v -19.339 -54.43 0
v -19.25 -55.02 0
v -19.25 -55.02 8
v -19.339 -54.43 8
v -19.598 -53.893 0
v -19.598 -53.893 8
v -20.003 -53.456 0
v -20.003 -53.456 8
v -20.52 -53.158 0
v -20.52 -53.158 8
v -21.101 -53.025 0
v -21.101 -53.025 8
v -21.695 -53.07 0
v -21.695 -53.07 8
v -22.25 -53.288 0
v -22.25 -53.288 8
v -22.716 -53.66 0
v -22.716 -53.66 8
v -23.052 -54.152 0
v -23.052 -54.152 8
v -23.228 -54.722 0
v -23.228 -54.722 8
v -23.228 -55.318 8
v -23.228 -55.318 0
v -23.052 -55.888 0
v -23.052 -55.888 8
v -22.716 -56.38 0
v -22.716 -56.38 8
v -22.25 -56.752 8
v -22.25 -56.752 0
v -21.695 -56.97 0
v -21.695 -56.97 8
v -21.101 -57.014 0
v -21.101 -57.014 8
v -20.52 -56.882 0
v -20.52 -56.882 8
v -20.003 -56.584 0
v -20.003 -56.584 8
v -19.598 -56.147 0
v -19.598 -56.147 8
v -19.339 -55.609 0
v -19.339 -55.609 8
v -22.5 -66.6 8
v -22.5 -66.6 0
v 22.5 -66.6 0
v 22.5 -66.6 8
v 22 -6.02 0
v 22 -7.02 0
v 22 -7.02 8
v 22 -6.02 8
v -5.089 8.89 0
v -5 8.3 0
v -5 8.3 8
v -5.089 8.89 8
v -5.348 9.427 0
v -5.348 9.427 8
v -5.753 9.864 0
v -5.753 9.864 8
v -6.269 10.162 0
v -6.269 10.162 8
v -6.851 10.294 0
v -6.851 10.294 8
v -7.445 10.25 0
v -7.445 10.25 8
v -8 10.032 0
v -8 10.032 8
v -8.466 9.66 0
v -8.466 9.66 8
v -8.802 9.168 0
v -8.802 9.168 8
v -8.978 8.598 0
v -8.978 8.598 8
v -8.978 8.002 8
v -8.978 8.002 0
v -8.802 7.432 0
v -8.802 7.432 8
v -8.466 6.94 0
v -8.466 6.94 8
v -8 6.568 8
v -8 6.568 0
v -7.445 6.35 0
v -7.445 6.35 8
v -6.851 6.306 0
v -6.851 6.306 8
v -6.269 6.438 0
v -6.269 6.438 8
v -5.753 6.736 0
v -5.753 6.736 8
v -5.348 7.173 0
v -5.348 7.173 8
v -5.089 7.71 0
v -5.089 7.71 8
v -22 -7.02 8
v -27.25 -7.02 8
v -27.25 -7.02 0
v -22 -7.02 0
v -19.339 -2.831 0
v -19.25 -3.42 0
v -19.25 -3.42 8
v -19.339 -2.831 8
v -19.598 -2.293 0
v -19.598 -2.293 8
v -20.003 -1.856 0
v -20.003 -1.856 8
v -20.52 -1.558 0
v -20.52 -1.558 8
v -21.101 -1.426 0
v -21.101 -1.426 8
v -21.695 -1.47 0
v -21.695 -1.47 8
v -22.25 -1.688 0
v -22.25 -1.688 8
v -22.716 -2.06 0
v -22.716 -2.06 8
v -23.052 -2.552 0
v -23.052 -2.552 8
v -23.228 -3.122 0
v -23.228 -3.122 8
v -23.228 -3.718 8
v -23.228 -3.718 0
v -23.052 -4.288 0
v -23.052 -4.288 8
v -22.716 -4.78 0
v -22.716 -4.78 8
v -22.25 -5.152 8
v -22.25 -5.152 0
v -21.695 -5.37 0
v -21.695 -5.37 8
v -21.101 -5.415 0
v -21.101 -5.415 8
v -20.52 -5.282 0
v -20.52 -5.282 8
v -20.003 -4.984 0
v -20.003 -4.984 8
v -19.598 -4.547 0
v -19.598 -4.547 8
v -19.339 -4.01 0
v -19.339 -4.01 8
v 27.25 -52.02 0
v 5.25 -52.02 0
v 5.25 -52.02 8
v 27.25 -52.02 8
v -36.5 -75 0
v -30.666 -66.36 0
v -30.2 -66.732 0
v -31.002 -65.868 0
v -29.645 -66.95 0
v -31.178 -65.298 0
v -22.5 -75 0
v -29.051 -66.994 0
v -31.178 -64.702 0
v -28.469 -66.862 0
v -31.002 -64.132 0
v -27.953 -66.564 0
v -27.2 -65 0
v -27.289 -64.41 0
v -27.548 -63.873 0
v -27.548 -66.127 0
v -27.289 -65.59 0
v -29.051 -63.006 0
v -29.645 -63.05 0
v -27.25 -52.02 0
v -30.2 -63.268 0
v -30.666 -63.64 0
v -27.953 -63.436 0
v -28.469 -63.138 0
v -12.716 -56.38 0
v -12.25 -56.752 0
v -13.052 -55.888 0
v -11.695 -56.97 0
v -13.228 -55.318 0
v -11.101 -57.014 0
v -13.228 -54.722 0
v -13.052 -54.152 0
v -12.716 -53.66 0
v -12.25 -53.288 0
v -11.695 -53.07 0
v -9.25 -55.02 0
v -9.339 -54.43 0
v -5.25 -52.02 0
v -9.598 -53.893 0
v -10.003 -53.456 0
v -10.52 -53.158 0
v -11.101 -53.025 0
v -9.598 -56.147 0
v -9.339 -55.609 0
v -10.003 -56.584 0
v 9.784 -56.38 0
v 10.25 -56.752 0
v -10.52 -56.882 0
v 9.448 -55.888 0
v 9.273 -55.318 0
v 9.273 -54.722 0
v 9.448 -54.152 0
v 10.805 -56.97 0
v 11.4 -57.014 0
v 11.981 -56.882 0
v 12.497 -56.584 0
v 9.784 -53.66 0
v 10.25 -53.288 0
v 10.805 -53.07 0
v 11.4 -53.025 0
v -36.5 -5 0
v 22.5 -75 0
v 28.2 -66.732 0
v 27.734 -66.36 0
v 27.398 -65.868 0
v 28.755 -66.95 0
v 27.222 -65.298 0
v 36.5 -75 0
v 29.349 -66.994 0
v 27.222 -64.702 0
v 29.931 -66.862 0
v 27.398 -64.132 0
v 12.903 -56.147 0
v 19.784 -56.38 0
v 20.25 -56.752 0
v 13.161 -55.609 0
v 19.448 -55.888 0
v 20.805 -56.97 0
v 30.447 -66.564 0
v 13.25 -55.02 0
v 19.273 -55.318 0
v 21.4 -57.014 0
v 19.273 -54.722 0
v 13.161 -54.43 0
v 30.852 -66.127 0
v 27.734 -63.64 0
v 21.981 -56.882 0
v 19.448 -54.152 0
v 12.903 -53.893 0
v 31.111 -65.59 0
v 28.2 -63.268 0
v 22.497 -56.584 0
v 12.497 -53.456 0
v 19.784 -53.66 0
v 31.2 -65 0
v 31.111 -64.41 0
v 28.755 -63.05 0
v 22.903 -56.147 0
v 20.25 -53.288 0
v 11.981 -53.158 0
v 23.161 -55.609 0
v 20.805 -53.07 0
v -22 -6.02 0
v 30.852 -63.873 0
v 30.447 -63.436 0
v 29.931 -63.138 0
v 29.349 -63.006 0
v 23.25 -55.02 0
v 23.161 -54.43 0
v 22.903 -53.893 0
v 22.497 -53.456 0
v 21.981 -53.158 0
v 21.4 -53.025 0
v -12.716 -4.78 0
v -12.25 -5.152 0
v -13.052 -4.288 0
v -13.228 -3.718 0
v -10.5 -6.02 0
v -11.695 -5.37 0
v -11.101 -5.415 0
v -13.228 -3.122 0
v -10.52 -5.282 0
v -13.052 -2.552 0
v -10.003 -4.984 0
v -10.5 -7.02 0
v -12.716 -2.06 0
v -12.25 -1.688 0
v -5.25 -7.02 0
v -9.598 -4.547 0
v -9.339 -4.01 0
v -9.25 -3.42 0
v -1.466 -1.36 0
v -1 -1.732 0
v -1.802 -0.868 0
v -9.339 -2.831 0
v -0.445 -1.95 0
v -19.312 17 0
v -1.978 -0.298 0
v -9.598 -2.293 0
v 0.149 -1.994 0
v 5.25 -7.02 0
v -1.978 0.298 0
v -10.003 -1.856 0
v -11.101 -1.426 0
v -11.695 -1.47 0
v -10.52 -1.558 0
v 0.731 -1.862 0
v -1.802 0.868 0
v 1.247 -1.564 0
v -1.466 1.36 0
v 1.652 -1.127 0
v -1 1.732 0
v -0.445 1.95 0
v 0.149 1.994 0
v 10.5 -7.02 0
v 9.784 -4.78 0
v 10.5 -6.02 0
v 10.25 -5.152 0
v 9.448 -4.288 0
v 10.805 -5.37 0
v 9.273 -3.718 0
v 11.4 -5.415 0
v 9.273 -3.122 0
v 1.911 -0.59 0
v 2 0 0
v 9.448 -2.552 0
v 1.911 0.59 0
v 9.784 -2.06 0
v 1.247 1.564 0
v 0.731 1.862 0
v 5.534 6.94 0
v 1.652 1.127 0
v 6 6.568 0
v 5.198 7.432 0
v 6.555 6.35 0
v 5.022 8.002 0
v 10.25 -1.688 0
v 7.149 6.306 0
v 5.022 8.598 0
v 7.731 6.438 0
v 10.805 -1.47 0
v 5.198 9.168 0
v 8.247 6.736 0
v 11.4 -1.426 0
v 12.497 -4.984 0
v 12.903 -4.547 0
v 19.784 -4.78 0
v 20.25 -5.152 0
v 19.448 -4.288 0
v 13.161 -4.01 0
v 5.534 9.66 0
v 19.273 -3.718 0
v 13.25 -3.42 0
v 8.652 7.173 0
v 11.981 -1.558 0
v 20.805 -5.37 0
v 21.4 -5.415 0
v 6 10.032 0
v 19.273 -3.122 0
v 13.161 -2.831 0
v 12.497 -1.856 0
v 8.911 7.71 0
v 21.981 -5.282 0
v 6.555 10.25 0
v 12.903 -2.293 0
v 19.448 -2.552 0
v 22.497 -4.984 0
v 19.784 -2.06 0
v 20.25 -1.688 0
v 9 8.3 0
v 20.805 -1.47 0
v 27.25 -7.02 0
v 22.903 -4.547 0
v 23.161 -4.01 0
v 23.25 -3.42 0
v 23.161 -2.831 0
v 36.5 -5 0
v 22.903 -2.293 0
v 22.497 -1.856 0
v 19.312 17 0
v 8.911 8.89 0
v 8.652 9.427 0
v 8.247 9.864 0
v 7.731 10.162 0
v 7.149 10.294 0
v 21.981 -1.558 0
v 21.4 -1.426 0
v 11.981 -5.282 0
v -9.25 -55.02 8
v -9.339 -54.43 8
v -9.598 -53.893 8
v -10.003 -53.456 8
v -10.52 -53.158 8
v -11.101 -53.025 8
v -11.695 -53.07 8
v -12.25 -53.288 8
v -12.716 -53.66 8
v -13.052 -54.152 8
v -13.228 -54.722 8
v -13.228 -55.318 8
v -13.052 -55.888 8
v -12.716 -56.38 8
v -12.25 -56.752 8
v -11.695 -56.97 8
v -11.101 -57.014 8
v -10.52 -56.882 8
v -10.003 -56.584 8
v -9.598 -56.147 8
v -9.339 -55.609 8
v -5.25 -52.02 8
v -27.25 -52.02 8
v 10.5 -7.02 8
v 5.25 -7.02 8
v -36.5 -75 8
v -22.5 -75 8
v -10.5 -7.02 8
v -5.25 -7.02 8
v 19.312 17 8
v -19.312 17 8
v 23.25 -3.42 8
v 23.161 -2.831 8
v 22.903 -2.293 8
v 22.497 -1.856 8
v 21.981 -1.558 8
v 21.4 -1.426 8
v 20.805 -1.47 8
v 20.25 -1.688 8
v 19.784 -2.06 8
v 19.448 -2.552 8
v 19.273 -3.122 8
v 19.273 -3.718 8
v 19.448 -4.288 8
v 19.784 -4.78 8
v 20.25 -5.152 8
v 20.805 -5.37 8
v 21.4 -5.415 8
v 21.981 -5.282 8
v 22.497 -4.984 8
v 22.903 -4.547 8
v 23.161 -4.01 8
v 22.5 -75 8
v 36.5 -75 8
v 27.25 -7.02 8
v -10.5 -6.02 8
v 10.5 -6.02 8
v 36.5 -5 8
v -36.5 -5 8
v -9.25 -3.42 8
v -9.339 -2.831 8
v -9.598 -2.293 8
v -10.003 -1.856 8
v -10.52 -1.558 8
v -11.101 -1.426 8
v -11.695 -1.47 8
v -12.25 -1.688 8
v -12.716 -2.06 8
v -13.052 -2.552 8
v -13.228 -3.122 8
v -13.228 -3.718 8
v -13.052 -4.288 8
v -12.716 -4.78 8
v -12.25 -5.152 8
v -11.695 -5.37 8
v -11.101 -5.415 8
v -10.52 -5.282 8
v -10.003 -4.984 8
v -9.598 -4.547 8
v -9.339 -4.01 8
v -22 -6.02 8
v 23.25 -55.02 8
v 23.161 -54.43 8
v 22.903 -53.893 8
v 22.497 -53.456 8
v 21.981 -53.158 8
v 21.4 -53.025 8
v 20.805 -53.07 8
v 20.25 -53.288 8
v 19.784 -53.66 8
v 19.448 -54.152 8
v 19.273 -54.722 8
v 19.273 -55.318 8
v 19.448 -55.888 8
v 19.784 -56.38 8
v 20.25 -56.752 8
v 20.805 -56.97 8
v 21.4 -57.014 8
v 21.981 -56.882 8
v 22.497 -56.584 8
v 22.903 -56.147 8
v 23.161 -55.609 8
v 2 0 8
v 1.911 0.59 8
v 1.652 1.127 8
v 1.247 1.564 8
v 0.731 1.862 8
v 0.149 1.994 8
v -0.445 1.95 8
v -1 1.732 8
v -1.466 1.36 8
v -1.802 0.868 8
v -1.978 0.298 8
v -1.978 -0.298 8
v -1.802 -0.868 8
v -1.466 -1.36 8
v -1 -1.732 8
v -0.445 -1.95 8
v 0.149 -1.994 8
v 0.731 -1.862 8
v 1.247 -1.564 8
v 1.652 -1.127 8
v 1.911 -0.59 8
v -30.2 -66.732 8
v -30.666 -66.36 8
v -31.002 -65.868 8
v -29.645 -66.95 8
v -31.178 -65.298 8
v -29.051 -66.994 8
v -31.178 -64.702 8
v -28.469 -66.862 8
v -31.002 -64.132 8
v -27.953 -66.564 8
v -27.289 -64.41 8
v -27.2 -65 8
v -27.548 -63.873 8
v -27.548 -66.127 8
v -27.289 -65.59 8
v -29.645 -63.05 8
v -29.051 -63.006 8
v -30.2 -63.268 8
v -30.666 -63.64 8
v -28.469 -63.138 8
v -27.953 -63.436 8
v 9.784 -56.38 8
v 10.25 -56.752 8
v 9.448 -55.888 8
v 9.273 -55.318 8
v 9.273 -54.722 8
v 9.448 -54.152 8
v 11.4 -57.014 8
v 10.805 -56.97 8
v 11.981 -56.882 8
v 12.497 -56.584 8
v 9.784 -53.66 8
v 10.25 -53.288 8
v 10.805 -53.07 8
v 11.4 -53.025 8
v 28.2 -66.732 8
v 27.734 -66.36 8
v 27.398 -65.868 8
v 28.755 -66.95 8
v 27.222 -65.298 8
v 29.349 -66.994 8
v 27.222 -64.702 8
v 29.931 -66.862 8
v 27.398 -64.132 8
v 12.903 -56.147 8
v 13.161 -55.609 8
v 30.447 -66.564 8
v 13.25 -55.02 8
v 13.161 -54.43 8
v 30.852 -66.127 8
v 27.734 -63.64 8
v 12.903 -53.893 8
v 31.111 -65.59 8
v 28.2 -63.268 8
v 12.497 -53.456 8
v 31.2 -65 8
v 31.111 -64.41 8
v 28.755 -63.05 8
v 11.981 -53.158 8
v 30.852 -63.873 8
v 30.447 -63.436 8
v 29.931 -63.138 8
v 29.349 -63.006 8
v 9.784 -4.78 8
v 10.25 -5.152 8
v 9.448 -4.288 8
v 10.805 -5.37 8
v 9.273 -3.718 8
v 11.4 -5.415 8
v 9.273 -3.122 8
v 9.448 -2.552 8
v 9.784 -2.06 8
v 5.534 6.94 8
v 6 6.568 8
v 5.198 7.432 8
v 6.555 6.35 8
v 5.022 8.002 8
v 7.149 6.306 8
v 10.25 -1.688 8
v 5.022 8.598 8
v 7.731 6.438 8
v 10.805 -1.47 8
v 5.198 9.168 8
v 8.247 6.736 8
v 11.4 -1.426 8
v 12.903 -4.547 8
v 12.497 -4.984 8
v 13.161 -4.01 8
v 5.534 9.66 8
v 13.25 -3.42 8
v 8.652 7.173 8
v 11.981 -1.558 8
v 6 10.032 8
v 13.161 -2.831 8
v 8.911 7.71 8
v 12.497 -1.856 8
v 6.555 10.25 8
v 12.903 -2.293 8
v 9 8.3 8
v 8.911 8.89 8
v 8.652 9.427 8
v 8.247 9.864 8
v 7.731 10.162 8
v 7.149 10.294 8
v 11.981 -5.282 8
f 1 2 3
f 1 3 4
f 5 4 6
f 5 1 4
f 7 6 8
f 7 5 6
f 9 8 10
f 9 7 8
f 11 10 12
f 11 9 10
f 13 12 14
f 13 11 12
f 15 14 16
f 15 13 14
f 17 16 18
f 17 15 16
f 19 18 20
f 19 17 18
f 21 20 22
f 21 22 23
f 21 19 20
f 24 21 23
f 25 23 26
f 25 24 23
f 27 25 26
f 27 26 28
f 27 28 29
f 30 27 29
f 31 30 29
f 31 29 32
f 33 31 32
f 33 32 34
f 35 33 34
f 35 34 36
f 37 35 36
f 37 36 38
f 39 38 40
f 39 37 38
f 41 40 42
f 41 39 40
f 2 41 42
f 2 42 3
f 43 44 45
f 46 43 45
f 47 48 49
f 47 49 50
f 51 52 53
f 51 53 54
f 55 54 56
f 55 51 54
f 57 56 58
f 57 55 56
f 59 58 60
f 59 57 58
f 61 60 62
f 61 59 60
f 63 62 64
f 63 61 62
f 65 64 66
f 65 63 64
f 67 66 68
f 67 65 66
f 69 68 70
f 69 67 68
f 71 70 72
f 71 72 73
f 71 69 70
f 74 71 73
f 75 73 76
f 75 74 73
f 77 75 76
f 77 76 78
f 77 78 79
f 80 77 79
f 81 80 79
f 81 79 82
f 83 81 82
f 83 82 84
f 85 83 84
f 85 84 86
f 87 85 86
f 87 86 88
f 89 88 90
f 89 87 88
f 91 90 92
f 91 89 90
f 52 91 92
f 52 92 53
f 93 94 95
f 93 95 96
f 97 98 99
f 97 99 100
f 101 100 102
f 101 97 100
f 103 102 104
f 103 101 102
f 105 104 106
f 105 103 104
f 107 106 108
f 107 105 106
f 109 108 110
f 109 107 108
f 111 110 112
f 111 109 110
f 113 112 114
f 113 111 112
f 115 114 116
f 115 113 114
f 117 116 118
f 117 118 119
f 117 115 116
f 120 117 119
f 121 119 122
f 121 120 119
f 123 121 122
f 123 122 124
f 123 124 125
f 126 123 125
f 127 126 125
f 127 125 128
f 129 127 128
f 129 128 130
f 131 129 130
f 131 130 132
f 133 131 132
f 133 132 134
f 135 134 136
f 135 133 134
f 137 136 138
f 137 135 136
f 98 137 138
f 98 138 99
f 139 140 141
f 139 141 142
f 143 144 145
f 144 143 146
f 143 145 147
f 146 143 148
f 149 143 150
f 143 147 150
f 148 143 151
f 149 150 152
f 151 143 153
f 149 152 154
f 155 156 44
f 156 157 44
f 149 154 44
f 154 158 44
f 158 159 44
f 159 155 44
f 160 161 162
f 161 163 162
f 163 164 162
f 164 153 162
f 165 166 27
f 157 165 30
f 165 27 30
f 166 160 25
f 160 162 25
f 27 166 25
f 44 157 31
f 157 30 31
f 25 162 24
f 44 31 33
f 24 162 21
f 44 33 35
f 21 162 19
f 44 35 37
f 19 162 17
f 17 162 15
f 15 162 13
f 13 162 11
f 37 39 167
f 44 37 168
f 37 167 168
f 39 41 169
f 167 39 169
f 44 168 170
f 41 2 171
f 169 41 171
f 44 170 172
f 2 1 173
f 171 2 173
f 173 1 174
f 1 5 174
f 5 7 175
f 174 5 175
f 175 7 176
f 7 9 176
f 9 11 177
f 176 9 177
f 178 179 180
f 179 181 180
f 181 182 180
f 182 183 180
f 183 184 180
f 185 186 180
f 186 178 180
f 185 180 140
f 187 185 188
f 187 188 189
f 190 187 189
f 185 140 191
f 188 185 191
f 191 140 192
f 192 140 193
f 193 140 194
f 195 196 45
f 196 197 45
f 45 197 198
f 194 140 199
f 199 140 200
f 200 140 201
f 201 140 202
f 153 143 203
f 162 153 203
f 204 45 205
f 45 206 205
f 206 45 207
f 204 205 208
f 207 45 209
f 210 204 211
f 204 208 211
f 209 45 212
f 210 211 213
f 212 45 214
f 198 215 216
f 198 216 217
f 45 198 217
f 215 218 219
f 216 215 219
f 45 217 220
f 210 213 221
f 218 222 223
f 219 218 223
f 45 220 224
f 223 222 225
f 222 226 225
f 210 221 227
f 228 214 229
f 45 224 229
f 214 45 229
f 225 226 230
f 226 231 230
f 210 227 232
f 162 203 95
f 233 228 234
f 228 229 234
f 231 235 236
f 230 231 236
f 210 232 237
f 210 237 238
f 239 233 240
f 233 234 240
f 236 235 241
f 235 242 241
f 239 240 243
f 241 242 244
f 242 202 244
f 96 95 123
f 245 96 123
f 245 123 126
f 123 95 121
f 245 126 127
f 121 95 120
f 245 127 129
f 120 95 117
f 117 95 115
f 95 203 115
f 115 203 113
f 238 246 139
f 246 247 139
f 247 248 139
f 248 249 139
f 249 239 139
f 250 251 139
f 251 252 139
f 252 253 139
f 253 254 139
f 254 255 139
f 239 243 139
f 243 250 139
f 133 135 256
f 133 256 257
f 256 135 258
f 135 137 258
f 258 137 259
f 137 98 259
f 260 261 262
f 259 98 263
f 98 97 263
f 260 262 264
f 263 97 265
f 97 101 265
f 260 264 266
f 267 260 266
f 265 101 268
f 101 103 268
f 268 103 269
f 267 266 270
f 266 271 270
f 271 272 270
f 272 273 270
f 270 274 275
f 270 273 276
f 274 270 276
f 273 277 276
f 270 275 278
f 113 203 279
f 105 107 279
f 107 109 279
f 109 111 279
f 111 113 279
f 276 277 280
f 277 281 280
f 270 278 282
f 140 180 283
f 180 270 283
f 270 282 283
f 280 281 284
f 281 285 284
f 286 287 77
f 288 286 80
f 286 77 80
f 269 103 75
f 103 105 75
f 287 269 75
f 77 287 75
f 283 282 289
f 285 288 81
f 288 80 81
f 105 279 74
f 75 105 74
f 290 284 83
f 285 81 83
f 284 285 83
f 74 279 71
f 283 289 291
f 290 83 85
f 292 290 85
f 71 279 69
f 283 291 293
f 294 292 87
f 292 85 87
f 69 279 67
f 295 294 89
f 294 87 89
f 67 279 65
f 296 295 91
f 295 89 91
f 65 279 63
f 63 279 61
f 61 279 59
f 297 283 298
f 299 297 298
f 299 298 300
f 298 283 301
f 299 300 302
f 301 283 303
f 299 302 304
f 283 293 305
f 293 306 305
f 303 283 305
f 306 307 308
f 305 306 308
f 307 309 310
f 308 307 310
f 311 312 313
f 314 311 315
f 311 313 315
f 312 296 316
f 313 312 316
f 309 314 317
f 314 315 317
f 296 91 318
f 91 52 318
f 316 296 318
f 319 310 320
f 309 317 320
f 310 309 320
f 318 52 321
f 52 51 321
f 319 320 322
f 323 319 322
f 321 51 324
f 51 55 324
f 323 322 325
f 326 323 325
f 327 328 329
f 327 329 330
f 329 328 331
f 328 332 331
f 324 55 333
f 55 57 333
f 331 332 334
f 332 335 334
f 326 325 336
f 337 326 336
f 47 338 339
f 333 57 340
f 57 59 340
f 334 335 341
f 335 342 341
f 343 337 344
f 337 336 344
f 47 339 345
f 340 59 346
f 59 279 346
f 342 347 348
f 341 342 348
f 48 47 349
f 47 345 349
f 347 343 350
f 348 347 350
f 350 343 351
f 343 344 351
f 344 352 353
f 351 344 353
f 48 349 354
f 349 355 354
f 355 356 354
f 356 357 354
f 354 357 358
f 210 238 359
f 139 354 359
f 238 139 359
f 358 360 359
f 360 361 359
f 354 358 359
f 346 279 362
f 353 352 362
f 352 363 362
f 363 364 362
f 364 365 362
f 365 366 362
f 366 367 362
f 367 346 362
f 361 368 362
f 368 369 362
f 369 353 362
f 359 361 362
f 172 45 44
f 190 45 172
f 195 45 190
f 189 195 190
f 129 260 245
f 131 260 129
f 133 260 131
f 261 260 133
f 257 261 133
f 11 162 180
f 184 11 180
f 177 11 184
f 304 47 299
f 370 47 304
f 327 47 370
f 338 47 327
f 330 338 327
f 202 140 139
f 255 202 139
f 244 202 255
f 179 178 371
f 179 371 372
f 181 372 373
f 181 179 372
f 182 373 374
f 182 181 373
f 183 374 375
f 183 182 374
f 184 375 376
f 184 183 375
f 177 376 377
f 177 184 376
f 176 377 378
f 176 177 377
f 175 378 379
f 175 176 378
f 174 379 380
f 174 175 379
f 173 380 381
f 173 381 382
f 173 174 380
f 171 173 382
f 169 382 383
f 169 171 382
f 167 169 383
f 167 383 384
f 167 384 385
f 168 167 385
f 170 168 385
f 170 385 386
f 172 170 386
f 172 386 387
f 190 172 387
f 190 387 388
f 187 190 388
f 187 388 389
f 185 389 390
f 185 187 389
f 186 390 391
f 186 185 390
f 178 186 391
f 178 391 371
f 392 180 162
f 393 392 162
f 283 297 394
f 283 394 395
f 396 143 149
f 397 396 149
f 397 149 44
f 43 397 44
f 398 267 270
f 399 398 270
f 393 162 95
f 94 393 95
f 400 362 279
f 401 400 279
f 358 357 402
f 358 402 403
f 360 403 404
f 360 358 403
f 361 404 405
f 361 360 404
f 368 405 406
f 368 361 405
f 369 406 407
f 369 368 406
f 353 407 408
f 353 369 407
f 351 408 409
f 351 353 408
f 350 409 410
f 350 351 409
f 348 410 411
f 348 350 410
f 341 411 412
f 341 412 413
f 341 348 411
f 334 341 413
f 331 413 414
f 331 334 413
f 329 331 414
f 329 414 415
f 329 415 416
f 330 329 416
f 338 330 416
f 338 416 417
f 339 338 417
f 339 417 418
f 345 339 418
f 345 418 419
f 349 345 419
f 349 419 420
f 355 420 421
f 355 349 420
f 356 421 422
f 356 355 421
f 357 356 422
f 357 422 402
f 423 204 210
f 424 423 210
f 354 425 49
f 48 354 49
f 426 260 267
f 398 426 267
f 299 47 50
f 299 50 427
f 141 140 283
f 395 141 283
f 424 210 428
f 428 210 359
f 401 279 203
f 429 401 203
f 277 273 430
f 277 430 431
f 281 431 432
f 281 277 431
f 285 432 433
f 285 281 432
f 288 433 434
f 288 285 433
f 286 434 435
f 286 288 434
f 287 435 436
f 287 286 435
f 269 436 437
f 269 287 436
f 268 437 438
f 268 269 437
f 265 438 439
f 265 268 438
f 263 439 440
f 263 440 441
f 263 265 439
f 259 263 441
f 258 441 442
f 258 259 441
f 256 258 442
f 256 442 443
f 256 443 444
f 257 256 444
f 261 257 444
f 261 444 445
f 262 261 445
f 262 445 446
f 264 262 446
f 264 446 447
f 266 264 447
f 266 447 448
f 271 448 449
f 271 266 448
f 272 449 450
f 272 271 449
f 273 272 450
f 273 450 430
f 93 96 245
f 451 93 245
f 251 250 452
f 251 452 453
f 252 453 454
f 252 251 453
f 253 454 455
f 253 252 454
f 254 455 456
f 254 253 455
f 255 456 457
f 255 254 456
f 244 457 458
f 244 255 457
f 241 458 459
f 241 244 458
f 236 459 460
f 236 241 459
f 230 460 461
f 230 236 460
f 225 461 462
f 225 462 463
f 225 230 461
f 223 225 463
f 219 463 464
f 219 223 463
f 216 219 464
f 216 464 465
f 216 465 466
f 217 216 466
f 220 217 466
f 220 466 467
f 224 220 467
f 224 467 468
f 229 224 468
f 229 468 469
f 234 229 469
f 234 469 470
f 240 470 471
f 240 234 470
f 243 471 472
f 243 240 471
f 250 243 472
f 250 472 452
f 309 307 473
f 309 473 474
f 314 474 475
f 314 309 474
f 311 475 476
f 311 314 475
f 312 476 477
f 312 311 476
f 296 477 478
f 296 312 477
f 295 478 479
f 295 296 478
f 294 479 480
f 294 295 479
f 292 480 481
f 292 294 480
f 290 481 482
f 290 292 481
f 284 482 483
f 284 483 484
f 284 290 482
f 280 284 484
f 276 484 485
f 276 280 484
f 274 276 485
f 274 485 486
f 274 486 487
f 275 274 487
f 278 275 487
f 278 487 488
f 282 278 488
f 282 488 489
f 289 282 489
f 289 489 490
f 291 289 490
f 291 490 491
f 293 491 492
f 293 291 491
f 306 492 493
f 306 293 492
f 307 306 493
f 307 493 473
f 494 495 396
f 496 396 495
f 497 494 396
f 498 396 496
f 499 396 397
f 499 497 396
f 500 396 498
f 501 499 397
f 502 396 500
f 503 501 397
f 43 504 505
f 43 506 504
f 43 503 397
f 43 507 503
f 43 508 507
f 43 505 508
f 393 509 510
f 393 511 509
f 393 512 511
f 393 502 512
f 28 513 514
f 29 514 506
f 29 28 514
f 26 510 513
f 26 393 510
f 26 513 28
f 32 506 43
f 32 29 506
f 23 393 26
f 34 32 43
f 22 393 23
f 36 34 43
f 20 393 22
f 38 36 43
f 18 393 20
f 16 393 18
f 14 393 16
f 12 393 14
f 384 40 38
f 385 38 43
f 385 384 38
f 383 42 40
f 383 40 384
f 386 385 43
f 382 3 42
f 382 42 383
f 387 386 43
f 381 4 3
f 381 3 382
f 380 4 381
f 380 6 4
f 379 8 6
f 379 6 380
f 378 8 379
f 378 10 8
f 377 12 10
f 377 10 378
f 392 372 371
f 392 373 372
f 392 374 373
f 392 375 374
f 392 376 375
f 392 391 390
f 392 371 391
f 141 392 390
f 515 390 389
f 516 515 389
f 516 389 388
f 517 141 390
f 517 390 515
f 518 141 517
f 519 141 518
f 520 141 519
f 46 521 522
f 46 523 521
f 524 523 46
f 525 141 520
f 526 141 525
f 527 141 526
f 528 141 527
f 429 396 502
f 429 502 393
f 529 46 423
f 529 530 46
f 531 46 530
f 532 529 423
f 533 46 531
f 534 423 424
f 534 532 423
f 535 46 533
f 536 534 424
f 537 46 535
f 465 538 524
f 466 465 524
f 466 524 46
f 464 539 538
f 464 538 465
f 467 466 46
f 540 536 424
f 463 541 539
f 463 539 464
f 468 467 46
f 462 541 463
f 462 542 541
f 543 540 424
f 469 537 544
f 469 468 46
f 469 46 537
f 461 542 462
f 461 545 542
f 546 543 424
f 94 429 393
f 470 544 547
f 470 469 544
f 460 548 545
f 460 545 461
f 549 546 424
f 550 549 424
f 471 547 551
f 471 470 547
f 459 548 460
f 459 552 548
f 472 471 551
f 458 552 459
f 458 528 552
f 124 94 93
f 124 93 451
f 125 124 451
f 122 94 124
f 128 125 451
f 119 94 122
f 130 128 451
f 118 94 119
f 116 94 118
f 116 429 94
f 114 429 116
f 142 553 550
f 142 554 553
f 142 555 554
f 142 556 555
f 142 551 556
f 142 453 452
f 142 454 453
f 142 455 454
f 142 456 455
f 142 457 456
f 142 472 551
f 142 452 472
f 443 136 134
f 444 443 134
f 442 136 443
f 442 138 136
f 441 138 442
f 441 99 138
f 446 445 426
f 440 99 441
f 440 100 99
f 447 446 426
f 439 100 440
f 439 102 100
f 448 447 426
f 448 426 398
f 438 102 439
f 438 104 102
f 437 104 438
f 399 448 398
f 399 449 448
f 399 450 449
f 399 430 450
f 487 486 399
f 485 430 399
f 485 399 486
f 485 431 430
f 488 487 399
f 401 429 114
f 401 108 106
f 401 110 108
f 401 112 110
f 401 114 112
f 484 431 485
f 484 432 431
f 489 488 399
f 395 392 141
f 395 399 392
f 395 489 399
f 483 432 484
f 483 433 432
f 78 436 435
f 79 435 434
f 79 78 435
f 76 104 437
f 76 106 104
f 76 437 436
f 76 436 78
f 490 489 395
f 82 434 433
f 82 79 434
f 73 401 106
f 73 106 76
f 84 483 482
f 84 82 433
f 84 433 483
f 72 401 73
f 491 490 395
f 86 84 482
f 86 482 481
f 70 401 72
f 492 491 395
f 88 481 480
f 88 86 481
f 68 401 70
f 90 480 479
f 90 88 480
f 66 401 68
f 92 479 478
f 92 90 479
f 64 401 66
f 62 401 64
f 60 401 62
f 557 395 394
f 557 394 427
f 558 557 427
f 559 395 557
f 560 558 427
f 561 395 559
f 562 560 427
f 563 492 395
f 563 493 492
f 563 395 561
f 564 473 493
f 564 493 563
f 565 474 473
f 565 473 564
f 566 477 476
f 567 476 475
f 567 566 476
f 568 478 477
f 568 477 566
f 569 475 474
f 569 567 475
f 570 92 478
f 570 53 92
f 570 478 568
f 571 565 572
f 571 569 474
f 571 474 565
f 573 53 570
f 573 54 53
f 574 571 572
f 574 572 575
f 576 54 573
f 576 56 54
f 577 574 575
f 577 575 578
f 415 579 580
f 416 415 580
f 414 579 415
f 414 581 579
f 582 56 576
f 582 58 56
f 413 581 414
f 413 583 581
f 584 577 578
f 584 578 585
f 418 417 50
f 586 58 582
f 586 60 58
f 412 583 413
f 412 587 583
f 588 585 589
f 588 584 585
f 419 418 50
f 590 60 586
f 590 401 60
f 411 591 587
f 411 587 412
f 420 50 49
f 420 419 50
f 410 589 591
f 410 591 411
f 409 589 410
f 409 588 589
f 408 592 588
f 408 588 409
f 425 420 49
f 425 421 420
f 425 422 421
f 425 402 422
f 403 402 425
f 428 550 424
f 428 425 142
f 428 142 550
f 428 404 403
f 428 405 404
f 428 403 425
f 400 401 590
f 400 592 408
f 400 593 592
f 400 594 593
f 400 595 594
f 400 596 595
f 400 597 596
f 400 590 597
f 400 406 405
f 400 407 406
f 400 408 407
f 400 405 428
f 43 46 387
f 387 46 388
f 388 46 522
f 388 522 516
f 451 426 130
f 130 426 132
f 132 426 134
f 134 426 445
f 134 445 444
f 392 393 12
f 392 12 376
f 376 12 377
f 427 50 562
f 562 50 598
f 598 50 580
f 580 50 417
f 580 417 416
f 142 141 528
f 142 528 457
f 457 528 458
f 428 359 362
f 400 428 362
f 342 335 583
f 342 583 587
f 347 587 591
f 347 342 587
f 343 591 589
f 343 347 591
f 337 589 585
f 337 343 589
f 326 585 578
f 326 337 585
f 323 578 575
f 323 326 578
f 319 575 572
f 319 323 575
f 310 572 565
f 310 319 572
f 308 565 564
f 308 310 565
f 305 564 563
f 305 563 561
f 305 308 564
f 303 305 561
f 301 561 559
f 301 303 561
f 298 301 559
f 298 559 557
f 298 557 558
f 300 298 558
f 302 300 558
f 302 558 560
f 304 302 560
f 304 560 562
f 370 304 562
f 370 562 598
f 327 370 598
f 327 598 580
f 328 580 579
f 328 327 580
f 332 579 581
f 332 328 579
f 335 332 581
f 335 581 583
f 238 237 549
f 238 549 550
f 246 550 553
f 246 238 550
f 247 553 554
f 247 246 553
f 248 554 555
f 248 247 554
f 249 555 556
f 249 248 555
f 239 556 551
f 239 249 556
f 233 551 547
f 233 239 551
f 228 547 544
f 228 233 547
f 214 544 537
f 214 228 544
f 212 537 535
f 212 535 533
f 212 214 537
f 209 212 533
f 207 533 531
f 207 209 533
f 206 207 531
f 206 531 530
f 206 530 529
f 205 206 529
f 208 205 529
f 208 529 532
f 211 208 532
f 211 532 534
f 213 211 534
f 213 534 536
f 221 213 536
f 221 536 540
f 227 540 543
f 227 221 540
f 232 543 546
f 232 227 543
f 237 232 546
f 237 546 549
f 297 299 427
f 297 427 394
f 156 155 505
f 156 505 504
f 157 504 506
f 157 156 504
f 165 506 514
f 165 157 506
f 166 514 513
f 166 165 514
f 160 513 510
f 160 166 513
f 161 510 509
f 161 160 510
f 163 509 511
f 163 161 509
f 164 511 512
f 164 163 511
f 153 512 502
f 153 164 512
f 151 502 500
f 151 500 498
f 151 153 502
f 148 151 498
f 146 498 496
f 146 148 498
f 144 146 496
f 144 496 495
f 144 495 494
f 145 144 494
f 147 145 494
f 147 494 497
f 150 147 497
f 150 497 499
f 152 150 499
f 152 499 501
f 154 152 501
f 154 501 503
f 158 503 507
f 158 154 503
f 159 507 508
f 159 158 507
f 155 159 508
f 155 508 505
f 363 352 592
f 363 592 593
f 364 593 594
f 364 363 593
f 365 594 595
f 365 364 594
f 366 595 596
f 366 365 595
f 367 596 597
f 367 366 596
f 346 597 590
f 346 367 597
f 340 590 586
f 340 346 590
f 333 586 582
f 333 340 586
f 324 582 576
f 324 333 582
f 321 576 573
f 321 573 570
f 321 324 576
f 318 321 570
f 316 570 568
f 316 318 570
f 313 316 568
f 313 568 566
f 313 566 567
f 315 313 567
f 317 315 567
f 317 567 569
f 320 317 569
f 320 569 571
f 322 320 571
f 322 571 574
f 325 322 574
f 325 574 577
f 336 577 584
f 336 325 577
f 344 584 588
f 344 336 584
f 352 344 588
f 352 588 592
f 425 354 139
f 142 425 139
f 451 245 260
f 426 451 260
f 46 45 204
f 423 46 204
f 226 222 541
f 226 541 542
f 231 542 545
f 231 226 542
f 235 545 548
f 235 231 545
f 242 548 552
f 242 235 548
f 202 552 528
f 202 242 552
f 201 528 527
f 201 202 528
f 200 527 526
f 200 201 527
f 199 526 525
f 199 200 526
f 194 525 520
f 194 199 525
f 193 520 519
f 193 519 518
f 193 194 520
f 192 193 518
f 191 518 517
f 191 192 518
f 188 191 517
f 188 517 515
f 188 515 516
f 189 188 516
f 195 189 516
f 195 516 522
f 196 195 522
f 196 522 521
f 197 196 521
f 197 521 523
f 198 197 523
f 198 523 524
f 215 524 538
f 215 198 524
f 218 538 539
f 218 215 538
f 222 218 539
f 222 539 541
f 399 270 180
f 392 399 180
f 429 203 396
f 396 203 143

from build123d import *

# Parameters (mm, degrees)
ESBO_O1_R                = 2
RESSALTO_EXTRUS_O1_DEPTH = 8


with BuildPart() as part:
    # Esboço1 → Ressalto-extrusão1 (new body)
    with BuildSketch(Plane.XY):
        Polygon((19.311716217, 17), (-19.311716217, 17), (-36.5, -5), (-36.5, -75), (-22.499999998, -75), (-22.499999998, -66.599999996), (22.499999998, -66.599999996), (22.499999998, -75), (36.5, -75), (36.5, -5), align=None)
        with Locations((-21.250245, -3.420107551)):
            Circle(ESBO_O1_R, mode=Mode.SUBTRACT)
        with Locations((-11.250245, -55.019882032)):
            Circle(ESBO_O1_R, mode=Mode.SUBTRACT)
        with Locations((11.250245, -3.420107551)):
            Circle(ESBO_O1_R, mode=Mode.SUBTRACT)
        with Locations((21.250245, -55.019882032)):
            Circle(ESBO_O1_R, mode=Mode.SUBTRACT)
        with Locations((-21.250245, -55.019882032)):
            Circle(ESBO_O1_R, mode=Mode.SUBTRACT)
        with Locations((-11.250245, -3.420107551)):
            Circle(ESBO_O1_R, mode=Mode.SUBTRACT)
        with Locations((11.250245, -55.019882032)):
            Circle(ESBO_O1_R, mode=Mode.SUBTRACT)
        with Locations((21.250245, -3.420107551)):
            Circle(ESBO_O1_R, mode=Mode.SUBTRACT)
        Circle(ESBO_O1_R, mode=Mode.SUBTRACT)
        with Locations((-7, 8.3)):
            Circle(ESBO_O1_R, mode=Mode.SUBTRACT)
        with Locations((7, 8.3)):
            Circle(ESBO_O1_R, mode=Mode.SUBTRACT)
        with Locations((-29.2, -65)):
            Circle(ESBO_O1_R, mode=Mode.SUBTRACT)
        with Locations((29.2, -65)):
            Circle(ESBO_O1_R, mode=Mode.SUBTRACT)
        Polygon((-27.250245, -29.520107551), (-27.250245, -7.020107551), (-22.000245, -7.020107551), (-22.000245, -6.020107551), (-10.500245, -6.020107551), (-10.500245, -7.020107551), (-5.250245, -7.020107551), (-5.250245, -29.520107551), (-5.250245, -52.020107551), (-27.250245, -52.020107551), align=None, mode=Mode.SUBTRACT)
        Polygon((10.500245, -7.020107551), (5.250245, -7.020107551), (5.250245, -29.520107551), (5.250245, -52.020107551), (27.250245, -52.020107551), (27.250245, -29.520107551), (27.250245, -7.020107551), (22.000245, -7.020107551), (22.000245, -6.020107551), (10.500245, -6.020107551), align=None, mode=Mode.SUBTRACT)
    extrude(amount=RESSALTO_EXTRUS_O1_DEPTH)


solid = part.part
